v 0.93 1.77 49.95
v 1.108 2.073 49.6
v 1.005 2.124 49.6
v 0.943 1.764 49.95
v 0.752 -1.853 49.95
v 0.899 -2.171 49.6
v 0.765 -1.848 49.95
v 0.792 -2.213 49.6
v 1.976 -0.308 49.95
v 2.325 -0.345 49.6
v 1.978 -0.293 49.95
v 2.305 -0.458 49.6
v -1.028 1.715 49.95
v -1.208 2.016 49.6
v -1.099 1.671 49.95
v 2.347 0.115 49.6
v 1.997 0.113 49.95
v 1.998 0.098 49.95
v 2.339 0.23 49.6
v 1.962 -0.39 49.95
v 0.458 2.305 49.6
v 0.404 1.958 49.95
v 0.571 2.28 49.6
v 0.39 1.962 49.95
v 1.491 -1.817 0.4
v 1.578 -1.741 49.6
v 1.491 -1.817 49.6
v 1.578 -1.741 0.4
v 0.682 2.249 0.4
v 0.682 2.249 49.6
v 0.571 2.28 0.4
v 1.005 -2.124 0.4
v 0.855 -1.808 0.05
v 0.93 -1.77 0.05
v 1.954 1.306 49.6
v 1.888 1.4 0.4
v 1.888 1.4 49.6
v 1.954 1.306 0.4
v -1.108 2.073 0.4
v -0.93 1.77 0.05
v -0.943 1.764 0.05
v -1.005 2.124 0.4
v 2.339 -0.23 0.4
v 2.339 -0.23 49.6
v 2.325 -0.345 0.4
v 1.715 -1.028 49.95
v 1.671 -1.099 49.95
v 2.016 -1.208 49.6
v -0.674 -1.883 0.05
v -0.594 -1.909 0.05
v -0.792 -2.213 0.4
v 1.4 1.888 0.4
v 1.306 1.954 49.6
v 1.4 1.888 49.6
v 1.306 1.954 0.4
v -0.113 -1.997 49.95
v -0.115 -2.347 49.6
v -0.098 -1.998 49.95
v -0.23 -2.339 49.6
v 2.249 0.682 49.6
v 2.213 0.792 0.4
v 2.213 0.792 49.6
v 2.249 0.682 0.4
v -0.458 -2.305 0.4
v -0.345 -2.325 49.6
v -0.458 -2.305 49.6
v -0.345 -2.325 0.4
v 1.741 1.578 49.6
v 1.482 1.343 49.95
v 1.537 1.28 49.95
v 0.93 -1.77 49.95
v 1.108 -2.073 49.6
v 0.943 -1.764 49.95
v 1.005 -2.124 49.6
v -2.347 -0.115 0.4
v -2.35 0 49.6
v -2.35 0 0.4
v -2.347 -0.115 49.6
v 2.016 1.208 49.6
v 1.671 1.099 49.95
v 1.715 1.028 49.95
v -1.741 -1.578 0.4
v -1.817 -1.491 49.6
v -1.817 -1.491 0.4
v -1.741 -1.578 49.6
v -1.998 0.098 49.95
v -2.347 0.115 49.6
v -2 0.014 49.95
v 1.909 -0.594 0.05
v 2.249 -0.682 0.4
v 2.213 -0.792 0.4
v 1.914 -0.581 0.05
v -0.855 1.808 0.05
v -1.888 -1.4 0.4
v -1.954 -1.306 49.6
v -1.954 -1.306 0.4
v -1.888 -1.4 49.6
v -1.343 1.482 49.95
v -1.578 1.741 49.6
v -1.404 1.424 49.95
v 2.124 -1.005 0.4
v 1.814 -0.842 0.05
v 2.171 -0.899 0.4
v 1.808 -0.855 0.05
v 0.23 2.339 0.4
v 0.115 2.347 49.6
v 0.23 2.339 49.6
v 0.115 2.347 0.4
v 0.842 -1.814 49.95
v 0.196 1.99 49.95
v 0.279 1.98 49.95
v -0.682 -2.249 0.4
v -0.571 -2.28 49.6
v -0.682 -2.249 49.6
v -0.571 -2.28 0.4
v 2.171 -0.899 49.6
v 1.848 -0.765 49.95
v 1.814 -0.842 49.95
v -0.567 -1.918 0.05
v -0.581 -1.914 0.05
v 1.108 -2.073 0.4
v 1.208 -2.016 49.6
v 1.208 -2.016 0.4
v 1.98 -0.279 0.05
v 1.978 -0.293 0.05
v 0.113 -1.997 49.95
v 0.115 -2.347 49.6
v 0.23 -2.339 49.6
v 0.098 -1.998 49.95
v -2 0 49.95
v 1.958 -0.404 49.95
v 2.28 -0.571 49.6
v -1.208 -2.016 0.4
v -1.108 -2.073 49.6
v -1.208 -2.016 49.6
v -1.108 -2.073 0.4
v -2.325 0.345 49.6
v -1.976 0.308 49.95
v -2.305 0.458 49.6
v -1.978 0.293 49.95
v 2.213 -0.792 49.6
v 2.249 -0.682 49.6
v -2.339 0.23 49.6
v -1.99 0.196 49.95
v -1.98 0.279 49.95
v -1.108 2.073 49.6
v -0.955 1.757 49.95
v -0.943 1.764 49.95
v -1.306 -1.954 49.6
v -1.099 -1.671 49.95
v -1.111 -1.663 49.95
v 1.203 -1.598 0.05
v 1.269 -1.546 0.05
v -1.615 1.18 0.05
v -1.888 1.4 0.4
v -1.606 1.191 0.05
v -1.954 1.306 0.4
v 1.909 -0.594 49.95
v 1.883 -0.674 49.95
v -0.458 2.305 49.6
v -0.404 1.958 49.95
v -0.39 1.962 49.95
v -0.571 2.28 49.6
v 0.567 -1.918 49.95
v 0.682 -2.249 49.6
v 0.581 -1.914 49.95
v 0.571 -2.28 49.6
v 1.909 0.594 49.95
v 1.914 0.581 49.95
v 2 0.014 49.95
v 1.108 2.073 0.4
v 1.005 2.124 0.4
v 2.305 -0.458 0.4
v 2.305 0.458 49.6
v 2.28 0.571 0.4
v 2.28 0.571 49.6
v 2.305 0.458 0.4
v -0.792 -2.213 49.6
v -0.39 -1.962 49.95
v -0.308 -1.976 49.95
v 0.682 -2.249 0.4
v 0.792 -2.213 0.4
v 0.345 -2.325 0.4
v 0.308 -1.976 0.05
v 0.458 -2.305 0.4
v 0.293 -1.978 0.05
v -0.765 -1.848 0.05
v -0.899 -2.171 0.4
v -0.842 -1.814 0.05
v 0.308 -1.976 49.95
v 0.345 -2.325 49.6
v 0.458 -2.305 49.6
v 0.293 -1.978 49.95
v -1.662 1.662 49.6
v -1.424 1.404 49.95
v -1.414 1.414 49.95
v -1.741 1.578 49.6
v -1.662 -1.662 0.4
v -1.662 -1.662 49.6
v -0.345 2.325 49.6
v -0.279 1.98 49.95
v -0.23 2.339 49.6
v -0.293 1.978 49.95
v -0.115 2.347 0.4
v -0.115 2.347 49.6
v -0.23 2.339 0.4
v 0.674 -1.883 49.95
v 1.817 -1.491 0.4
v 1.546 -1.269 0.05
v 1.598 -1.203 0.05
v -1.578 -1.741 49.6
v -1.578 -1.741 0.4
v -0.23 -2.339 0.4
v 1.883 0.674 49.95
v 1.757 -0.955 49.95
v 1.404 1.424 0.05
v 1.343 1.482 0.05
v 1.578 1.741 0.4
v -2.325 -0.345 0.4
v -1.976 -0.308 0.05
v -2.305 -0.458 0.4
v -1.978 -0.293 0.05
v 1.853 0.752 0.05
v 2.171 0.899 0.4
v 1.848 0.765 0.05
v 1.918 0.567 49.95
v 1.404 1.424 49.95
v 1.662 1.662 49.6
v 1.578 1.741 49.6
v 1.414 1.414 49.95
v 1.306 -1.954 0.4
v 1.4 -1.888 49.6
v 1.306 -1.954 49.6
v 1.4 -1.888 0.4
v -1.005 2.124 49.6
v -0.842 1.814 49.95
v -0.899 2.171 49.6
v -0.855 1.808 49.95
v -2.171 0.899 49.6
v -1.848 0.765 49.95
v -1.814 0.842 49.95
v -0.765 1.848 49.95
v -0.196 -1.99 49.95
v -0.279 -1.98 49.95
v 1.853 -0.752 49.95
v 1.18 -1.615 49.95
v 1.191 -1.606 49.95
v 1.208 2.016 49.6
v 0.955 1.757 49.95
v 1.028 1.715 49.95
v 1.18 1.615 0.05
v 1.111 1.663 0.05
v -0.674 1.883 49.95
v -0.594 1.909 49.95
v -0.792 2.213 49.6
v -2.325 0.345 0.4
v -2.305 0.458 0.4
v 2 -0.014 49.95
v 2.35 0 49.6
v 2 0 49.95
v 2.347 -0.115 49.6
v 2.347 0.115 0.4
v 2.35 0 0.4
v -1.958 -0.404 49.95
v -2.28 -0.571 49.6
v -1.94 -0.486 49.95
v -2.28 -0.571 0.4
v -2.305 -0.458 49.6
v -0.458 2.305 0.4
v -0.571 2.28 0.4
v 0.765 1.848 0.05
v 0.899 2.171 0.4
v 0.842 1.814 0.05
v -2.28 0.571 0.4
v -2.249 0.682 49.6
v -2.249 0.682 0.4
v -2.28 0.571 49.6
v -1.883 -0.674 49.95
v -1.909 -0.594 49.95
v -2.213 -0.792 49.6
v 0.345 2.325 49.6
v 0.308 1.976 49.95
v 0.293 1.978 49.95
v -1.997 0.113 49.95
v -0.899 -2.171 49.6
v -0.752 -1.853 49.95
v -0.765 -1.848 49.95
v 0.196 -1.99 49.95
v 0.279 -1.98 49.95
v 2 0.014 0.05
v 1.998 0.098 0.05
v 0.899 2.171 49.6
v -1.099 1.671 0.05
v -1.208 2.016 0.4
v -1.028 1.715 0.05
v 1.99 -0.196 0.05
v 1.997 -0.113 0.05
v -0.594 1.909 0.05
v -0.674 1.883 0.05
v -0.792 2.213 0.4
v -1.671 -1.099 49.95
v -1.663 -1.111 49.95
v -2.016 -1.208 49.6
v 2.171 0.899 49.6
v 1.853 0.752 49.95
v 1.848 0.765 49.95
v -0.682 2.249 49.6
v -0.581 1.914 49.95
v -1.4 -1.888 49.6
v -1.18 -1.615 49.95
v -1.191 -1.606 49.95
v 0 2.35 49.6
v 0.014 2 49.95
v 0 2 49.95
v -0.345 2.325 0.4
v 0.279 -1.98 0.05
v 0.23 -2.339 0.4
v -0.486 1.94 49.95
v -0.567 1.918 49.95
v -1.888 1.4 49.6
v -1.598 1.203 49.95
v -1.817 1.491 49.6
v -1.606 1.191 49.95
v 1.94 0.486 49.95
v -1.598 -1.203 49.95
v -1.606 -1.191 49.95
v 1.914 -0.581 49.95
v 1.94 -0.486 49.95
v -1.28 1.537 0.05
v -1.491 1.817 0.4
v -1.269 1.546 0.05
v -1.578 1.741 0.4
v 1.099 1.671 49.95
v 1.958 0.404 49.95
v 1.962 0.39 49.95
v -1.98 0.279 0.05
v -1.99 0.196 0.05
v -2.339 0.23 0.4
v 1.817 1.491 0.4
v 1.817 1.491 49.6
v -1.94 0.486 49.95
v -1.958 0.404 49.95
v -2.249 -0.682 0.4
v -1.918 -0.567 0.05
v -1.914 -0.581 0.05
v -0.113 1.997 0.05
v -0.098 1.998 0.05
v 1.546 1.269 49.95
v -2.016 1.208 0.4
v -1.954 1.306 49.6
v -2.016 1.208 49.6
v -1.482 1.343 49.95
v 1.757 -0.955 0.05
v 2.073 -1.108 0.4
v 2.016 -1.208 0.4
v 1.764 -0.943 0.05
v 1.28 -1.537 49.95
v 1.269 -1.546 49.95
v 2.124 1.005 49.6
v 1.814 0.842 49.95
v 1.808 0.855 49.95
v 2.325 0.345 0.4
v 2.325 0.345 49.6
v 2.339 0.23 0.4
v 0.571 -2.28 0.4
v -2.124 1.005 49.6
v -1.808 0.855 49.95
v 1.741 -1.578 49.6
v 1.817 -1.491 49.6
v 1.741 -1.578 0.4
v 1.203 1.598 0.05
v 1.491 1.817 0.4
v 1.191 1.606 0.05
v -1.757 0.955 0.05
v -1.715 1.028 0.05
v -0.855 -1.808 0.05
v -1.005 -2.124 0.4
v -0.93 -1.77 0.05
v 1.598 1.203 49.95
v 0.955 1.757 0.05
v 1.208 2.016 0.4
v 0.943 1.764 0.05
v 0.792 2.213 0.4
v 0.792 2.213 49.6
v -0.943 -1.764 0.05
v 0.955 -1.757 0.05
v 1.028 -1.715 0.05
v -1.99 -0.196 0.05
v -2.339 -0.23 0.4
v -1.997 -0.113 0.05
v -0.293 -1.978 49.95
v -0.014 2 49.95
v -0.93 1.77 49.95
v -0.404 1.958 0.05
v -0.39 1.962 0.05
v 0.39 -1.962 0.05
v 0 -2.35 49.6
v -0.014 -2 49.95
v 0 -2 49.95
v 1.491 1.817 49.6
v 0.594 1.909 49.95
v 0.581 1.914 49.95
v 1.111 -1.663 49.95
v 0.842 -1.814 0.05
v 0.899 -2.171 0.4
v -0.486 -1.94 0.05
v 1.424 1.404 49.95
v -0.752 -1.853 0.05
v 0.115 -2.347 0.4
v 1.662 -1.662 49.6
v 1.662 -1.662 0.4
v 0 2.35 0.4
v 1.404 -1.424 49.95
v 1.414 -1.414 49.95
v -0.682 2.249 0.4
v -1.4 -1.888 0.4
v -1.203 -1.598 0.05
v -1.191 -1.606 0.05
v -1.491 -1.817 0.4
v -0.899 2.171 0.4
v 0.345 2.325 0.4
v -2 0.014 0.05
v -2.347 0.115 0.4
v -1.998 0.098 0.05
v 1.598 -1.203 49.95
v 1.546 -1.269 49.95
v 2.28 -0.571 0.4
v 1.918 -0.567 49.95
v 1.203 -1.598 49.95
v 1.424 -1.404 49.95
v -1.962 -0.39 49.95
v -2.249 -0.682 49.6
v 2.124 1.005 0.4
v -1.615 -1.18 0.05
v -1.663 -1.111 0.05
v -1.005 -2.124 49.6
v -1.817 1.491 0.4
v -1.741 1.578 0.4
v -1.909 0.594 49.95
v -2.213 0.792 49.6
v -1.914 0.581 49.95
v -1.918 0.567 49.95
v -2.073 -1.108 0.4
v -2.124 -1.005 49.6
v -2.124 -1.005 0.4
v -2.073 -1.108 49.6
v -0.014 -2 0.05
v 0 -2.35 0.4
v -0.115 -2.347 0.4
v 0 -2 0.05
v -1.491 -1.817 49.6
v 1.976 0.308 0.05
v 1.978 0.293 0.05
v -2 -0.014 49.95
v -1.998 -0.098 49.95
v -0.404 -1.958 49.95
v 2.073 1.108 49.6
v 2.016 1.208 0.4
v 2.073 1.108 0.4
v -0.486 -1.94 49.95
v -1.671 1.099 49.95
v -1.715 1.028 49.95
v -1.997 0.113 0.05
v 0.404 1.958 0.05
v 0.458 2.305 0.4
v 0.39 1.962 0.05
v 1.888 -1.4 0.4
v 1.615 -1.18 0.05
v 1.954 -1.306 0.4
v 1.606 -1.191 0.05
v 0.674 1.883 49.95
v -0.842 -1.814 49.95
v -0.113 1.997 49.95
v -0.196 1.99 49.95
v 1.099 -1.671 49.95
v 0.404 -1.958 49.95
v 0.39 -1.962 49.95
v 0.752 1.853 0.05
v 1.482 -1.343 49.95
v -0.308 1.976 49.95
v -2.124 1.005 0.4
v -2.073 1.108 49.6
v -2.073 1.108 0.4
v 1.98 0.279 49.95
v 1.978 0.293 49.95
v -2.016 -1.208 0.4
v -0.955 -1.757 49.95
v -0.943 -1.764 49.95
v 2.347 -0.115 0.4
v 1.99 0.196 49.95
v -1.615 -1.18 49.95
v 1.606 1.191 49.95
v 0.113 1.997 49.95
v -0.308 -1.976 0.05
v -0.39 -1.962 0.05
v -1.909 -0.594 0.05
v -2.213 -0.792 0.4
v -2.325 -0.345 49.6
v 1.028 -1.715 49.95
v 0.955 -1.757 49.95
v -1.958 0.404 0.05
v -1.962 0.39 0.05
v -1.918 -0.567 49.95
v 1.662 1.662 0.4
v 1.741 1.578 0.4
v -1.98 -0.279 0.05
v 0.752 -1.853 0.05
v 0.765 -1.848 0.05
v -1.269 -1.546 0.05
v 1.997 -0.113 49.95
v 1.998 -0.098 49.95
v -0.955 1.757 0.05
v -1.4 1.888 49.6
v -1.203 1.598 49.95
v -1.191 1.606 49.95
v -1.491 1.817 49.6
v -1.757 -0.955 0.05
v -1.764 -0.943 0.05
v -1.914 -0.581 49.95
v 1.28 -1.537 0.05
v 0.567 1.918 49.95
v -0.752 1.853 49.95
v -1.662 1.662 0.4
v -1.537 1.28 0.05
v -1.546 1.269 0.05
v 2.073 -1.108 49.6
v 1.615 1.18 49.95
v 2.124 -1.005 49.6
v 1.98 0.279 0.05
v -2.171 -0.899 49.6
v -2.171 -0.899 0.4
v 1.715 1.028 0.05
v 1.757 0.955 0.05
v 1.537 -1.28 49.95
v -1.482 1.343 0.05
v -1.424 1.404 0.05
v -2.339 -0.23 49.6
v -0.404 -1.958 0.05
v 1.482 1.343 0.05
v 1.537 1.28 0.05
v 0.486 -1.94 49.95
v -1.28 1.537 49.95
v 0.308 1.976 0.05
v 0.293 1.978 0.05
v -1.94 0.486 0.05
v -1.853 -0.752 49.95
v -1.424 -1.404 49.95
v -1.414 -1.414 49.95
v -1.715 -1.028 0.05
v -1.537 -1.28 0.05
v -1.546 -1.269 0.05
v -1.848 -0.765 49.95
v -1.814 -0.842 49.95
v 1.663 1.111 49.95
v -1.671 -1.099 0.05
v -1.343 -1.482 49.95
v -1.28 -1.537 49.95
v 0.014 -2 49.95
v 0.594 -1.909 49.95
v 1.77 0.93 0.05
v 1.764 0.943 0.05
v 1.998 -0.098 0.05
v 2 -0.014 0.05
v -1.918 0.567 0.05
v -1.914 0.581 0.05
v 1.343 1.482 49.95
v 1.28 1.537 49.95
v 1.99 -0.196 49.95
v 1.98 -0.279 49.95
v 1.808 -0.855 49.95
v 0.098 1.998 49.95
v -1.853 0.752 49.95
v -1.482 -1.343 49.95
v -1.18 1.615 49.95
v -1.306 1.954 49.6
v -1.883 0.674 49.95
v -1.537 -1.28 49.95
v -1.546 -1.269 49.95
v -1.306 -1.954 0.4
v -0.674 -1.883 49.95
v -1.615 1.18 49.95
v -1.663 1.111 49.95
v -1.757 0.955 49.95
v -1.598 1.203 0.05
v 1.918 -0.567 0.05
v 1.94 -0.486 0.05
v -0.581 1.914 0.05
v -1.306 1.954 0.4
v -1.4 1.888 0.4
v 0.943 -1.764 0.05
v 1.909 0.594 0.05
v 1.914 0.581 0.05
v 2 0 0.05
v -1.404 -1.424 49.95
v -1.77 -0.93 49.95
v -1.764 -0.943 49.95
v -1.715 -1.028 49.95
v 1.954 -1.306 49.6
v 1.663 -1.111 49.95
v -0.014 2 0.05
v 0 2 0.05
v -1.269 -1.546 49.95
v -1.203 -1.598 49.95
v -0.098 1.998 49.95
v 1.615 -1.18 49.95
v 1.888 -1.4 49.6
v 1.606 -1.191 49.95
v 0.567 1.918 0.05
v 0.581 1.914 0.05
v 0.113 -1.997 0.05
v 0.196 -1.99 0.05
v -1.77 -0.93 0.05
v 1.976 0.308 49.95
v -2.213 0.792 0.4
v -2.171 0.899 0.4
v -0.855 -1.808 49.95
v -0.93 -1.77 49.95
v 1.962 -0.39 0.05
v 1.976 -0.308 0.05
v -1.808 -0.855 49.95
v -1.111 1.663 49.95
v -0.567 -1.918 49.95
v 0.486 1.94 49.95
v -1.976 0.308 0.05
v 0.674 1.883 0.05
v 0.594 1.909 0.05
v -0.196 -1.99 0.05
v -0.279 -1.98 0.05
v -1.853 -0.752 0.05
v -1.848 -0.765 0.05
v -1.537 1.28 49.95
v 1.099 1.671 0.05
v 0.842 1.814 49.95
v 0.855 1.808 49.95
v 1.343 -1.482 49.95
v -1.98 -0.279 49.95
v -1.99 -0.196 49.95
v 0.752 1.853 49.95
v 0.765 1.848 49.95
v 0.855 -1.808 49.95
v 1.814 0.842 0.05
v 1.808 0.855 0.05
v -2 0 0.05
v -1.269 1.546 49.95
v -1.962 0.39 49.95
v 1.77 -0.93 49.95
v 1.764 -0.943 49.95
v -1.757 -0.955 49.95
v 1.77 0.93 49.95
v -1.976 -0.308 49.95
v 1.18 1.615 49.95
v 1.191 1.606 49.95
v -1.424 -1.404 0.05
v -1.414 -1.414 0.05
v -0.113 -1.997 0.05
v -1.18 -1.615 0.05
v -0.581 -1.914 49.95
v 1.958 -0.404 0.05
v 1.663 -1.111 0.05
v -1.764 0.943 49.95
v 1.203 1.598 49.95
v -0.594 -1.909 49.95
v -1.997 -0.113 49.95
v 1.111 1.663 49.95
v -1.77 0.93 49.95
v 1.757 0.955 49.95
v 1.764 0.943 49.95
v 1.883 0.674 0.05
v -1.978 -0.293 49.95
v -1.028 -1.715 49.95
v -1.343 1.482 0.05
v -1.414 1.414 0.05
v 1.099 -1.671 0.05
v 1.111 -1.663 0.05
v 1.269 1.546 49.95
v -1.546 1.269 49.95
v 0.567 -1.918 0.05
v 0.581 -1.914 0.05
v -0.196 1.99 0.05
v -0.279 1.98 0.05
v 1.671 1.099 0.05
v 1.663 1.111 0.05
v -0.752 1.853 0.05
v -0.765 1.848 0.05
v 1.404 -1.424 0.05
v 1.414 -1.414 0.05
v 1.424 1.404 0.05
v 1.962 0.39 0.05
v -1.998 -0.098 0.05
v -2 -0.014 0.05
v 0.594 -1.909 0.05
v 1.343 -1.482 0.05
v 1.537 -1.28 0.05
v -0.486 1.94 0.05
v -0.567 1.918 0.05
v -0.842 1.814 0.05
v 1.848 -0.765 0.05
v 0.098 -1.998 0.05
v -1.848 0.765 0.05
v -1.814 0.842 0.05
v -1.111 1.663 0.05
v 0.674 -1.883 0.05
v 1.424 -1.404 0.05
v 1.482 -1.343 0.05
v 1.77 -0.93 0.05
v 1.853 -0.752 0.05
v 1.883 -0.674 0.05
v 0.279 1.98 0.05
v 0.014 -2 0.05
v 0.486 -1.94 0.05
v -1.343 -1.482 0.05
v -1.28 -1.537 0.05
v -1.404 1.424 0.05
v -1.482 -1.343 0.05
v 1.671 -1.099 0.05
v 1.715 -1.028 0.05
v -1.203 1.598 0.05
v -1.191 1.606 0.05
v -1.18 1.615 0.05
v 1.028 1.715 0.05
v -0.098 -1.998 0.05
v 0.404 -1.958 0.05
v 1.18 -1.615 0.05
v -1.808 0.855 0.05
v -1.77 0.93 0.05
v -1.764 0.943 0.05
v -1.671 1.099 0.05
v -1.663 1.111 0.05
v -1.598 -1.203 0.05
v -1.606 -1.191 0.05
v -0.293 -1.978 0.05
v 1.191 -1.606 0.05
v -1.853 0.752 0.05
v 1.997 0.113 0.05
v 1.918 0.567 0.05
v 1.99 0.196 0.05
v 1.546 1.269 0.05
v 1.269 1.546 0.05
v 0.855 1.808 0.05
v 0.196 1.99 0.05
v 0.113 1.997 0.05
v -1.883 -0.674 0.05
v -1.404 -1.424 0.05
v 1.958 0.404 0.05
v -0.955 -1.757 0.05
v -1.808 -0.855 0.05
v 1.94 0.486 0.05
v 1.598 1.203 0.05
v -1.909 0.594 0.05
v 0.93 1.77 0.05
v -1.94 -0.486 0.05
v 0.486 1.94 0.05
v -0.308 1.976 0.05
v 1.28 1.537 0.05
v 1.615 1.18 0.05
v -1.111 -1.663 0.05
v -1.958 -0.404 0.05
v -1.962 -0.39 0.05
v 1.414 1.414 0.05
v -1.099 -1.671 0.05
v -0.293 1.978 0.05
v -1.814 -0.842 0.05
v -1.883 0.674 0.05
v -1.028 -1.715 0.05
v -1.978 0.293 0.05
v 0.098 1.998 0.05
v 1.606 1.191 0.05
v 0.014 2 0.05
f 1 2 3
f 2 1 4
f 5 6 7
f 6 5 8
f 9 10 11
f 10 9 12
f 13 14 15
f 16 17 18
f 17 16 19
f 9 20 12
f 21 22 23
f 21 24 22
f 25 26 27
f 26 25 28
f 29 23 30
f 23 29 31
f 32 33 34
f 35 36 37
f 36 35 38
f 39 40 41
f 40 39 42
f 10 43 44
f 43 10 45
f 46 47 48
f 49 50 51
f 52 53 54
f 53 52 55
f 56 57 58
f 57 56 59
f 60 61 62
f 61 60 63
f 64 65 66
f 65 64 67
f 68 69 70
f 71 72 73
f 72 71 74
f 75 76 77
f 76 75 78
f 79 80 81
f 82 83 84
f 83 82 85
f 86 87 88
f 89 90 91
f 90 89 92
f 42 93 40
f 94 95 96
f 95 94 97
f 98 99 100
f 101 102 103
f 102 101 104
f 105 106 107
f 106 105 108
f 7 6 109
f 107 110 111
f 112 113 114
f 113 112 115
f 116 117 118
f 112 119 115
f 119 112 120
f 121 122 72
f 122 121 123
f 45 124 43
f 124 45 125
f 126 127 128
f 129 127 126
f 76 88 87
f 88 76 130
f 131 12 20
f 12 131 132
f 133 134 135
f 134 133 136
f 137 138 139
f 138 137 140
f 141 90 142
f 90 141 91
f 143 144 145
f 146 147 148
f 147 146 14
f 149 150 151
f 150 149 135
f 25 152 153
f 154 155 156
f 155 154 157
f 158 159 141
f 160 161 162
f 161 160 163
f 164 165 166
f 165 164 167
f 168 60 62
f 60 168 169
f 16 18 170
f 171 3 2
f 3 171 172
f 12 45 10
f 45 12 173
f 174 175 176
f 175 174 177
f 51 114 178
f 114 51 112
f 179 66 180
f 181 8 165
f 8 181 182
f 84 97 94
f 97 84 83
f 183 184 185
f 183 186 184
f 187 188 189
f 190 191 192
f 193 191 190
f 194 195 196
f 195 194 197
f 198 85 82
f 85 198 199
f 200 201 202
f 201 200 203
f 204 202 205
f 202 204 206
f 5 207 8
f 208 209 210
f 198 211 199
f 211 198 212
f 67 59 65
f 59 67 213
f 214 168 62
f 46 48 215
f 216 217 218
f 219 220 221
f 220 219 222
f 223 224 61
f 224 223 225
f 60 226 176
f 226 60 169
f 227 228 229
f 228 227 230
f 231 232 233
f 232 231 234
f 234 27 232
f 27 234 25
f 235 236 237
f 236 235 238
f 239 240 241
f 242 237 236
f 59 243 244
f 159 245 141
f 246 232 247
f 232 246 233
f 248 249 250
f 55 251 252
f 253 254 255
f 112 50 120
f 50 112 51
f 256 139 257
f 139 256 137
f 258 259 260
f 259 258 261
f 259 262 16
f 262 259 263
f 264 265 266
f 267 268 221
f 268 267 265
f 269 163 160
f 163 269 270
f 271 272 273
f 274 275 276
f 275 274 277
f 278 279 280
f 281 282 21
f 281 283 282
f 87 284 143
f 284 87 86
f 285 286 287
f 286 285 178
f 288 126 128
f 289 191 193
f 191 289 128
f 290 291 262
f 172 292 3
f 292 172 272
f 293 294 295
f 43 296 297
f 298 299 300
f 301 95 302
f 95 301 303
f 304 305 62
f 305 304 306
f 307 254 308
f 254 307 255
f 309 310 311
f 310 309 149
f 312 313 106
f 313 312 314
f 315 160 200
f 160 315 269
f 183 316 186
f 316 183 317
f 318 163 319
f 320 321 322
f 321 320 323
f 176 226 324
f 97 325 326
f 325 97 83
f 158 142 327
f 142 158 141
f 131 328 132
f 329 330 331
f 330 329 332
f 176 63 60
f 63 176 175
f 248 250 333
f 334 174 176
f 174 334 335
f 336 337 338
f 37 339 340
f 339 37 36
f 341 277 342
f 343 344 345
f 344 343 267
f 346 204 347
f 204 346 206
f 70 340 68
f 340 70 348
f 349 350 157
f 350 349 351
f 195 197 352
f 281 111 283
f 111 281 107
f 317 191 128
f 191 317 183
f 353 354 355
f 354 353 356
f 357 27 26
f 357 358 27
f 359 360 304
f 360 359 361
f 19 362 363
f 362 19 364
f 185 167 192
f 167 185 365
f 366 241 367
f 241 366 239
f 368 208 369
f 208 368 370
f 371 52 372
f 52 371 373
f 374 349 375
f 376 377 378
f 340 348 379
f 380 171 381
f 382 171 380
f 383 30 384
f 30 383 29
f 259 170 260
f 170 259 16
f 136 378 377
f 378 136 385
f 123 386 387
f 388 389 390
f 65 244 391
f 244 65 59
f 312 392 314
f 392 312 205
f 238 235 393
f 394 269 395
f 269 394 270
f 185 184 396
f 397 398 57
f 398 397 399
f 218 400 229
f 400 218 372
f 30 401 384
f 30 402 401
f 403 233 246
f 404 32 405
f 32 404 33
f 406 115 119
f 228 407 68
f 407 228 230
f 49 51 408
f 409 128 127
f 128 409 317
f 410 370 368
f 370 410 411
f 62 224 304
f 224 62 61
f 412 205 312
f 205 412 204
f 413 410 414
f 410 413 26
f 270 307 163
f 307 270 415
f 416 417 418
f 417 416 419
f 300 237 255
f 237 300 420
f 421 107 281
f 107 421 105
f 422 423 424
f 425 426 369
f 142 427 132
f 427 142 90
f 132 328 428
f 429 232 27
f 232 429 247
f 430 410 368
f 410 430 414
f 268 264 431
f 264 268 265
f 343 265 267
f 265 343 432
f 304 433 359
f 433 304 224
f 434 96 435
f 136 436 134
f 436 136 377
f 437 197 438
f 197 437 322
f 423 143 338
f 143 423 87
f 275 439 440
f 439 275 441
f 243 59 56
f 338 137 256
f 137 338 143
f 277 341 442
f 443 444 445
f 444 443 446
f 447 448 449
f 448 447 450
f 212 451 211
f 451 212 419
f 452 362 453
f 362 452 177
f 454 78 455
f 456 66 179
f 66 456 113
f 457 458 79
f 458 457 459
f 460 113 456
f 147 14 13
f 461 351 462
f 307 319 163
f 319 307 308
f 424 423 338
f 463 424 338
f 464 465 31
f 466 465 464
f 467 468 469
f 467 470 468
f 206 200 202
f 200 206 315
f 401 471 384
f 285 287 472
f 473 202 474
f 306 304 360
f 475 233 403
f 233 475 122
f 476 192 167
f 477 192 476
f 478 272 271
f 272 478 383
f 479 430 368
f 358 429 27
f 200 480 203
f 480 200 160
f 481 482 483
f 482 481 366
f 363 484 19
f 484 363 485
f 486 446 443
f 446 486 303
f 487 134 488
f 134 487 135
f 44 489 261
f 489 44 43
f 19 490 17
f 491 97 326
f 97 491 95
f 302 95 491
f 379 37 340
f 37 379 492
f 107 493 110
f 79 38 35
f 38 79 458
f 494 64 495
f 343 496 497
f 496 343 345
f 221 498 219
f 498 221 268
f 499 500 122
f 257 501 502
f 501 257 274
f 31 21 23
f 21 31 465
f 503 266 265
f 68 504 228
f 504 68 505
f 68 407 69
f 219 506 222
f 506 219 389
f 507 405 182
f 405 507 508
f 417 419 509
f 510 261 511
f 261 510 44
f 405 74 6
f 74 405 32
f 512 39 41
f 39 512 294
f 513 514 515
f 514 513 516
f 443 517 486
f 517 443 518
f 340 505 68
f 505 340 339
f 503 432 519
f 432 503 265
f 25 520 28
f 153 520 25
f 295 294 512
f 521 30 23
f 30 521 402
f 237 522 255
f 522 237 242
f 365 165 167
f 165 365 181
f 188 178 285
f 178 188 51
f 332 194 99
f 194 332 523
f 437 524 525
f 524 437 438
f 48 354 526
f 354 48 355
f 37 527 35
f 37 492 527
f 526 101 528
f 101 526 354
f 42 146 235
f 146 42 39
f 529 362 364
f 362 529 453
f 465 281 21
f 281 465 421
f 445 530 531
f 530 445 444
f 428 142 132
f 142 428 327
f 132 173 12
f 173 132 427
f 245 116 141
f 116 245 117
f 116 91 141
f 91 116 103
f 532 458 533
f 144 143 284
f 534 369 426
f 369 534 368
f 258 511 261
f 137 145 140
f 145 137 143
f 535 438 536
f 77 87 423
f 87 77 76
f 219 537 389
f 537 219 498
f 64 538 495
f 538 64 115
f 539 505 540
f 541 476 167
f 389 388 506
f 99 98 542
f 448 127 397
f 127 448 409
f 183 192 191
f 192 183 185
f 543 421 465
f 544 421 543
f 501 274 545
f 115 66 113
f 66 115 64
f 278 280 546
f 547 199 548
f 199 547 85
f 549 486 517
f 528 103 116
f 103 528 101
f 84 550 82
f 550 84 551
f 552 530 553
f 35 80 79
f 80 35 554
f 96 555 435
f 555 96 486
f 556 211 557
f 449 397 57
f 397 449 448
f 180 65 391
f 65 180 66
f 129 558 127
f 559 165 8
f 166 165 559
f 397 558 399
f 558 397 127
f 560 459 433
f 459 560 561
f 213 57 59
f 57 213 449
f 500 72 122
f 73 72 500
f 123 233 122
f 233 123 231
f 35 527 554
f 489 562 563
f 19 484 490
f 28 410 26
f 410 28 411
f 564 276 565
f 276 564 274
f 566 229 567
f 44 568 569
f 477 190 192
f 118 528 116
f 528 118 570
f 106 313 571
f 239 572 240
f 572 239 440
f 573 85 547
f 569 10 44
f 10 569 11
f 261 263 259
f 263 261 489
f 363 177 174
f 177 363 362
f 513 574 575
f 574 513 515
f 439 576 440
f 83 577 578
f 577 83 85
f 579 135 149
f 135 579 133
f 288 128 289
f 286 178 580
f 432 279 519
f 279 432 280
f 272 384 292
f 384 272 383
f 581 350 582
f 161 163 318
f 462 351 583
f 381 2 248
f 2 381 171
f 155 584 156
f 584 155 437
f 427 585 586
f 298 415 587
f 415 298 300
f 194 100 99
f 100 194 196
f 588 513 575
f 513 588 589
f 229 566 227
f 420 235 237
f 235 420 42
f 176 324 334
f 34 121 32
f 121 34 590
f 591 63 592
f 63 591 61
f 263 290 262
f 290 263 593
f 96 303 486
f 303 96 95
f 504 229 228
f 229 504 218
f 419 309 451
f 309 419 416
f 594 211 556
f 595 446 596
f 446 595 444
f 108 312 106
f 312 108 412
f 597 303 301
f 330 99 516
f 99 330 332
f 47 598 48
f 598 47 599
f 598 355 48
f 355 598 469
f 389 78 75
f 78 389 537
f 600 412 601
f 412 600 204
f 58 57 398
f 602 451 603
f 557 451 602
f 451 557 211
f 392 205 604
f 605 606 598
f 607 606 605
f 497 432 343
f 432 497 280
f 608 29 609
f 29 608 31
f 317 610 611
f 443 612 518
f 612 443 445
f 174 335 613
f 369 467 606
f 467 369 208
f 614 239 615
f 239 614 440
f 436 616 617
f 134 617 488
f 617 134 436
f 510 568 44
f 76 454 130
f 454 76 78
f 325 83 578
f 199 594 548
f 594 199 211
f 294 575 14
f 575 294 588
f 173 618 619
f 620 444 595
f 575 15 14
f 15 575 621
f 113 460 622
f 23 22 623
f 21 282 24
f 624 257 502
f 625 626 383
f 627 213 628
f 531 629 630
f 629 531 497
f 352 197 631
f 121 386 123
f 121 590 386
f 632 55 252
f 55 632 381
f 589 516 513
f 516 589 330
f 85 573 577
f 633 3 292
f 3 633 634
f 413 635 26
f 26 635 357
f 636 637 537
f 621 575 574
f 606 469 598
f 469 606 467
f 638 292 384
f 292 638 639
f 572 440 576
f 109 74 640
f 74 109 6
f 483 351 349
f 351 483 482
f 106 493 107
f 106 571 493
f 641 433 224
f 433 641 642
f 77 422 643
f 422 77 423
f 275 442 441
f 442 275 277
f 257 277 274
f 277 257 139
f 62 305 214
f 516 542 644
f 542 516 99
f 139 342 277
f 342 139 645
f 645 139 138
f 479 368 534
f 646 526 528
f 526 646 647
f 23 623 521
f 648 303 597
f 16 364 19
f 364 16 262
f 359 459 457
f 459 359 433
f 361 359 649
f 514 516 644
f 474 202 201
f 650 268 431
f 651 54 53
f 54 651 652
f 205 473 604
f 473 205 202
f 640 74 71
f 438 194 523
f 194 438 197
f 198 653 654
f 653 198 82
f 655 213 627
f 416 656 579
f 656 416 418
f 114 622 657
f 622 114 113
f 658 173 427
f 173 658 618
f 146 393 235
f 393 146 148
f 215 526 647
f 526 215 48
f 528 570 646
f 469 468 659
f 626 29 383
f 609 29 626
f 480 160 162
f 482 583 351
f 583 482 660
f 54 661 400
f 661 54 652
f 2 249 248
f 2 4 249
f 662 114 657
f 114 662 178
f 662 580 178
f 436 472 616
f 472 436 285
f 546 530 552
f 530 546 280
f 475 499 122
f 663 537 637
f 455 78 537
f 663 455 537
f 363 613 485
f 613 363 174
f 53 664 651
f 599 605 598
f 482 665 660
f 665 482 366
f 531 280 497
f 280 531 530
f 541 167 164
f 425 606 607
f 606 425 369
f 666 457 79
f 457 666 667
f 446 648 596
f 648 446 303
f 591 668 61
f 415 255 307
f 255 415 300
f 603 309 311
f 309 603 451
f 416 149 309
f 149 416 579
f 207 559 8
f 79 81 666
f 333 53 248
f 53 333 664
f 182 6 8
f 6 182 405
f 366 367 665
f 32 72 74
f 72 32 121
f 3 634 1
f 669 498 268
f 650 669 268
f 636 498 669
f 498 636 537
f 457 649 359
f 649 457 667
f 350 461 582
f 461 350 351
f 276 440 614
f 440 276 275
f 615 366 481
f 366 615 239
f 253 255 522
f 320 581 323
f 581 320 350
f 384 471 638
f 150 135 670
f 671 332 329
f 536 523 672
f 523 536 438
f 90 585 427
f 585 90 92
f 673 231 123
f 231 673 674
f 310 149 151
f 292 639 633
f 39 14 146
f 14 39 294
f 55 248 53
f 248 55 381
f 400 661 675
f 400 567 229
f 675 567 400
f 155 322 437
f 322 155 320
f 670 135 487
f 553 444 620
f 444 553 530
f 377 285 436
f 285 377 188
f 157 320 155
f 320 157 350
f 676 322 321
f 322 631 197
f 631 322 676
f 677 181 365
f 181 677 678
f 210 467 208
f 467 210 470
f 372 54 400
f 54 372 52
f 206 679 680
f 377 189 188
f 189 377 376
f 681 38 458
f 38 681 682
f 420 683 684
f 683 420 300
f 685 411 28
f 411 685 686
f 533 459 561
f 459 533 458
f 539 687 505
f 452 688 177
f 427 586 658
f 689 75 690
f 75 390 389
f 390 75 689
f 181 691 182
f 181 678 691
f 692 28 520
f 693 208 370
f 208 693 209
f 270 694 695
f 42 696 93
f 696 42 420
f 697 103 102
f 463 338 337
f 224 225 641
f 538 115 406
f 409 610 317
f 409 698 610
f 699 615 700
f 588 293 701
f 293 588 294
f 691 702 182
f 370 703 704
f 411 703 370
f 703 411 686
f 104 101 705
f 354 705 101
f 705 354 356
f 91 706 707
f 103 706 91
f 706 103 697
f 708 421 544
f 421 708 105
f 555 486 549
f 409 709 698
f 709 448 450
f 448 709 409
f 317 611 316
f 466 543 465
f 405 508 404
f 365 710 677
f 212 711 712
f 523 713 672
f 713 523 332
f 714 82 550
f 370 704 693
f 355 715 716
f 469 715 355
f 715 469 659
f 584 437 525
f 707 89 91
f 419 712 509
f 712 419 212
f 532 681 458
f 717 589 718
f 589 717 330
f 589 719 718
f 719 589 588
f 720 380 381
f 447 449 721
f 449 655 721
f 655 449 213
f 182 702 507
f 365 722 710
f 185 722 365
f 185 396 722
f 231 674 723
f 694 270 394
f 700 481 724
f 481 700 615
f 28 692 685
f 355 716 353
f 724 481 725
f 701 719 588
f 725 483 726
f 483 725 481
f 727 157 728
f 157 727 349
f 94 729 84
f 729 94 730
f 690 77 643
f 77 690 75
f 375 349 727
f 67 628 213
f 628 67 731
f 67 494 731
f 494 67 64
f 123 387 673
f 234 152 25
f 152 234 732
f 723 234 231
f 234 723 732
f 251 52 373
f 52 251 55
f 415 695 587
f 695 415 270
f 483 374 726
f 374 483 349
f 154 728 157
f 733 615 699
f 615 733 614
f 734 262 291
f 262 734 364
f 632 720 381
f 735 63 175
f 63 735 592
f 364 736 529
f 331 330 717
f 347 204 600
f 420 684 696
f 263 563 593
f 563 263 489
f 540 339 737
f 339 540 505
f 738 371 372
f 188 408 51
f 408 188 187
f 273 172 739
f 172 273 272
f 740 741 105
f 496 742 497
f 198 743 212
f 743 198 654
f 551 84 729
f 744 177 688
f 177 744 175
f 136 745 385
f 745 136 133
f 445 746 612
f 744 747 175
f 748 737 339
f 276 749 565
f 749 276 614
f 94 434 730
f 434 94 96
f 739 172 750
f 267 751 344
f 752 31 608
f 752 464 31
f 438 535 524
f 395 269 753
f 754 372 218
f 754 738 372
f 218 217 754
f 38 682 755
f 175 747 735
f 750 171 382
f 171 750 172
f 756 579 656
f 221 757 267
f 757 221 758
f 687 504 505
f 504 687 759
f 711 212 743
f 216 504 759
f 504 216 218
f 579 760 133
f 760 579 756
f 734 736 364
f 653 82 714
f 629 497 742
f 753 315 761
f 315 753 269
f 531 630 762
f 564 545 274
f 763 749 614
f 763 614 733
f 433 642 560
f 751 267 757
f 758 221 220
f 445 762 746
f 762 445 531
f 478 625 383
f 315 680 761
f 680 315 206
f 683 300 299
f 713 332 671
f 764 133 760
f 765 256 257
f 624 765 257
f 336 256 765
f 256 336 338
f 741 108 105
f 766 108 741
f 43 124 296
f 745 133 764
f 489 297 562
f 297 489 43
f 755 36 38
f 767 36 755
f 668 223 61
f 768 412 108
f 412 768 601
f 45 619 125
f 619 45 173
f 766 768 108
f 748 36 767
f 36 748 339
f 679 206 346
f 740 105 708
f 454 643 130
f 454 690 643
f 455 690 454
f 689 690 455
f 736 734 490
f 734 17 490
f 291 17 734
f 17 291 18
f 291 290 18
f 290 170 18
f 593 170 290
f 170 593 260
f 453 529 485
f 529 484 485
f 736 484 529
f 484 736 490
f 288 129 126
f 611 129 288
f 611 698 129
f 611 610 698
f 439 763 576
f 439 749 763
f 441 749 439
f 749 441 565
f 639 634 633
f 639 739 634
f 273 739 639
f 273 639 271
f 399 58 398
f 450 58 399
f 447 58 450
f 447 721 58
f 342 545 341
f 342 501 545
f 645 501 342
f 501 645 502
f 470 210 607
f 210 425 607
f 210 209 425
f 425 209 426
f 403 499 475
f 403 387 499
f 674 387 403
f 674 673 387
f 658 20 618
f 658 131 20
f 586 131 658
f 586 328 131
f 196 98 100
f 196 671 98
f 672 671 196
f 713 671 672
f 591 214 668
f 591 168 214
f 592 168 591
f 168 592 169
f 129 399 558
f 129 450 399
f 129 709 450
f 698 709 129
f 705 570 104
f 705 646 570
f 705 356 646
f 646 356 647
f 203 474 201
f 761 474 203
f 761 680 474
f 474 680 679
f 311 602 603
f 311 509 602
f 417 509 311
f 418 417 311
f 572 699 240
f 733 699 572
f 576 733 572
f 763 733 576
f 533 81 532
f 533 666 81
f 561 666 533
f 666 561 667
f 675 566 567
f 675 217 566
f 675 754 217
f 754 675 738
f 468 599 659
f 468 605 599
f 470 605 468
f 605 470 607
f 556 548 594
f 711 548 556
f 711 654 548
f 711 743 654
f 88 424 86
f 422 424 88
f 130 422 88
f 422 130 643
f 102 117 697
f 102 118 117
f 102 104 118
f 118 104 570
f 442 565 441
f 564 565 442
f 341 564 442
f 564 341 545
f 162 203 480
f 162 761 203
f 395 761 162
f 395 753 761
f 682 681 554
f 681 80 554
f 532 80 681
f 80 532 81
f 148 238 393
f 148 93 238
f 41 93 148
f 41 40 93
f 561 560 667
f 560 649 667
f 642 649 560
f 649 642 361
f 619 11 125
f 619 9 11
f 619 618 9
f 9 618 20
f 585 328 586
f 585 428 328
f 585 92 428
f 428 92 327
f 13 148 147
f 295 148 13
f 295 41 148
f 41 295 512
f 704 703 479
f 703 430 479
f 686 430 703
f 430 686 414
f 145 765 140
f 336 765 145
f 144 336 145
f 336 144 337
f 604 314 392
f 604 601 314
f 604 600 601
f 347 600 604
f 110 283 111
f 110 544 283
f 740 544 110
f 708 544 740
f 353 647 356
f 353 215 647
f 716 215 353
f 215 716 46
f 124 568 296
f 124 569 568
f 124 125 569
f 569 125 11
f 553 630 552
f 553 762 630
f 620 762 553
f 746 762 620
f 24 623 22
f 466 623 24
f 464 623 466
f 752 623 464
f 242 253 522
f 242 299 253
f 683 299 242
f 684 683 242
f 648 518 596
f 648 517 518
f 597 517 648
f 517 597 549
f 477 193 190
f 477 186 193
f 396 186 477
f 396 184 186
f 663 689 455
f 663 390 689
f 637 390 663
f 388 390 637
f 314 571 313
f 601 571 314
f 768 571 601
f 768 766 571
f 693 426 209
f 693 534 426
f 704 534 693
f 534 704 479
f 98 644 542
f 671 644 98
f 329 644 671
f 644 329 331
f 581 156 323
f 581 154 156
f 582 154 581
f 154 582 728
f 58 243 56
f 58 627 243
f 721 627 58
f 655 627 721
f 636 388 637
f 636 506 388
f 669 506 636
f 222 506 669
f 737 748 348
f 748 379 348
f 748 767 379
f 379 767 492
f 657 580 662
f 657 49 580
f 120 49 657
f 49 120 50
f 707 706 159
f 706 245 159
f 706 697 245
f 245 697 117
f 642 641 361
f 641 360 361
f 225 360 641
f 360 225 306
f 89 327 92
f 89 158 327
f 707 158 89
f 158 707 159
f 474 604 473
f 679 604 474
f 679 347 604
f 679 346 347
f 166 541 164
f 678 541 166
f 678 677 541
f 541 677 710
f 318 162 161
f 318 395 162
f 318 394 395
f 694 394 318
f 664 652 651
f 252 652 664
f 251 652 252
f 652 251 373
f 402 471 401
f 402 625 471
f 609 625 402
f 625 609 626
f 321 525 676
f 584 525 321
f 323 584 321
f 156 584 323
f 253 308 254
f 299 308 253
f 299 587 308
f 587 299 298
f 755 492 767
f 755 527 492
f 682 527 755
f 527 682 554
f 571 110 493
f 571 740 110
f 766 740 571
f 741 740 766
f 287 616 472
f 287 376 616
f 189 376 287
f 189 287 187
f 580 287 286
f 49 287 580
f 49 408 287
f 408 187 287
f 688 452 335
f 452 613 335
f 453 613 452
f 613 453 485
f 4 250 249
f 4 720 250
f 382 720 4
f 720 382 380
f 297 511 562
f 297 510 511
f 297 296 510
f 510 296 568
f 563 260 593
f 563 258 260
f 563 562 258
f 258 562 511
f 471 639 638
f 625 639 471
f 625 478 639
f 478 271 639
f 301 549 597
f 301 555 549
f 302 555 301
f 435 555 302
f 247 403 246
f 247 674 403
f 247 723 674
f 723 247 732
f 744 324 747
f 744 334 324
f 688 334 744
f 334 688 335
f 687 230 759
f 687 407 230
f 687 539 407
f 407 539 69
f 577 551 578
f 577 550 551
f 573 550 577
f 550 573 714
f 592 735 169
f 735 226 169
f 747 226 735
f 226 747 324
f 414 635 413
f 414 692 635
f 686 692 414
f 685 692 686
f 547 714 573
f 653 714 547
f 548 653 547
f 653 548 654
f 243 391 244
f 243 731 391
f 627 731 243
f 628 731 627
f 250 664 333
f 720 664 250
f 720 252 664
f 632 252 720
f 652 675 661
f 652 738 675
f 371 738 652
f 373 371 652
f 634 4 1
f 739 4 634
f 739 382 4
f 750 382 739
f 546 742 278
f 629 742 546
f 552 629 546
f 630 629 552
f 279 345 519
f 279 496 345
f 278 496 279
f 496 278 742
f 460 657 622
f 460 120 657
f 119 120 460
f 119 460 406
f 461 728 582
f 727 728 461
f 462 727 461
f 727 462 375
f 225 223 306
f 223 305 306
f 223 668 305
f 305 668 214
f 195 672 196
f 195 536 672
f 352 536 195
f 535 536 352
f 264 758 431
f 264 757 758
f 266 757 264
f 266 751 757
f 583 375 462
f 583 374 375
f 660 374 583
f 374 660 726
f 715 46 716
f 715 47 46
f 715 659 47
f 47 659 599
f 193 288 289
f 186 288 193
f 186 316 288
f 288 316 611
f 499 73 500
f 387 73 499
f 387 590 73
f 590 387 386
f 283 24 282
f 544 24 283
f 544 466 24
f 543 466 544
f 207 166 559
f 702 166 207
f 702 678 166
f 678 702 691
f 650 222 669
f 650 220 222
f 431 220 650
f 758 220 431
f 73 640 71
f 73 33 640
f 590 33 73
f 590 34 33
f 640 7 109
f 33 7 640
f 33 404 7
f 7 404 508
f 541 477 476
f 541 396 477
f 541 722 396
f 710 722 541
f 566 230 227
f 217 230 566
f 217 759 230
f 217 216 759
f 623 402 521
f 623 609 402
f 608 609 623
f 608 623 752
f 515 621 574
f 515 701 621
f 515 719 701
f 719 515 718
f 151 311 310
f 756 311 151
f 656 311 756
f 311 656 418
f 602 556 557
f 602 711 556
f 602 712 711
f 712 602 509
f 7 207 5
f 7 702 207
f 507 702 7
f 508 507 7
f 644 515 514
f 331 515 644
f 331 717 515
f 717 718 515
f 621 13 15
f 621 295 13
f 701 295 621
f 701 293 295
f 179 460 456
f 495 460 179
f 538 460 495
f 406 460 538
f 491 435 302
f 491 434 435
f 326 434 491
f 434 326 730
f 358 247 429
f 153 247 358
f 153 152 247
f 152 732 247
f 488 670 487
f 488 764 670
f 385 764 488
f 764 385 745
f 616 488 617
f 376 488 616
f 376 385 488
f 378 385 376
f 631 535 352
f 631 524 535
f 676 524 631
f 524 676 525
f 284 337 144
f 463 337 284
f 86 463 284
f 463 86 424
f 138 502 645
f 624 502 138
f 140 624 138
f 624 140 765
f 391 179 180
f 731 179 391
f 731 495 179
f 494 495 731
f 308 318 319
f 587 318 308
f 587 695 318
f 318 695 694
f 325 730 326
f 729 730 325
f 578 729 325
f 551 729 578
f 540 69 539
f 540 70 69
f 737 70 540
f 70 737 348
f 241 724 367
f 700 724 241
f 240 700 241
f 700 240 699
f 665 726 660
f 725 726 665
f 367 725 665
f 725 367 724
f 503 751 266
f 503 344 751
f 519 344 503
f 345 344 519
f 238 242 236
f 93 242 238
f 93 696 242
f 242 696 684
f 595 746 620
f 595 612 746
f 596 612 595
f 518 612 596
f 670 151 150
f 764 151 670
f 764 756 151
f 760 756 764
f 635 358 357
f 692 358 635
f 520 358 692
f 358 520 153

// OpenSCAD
$fn = 128;

// PTFE heatshrink sleeving (simple hollow tube model)
// Units: mm

// Parameters
length = 50;          // overall length
id = 4.0;             // inner diameter (before/after shrink as desired)
wall = 0.35;          // wall thickness
od = id + 2*wall;     // outer diameter

// Optional: slight end chamfer to mimic cut tubing
chamfer = 0.4;        // set to 0 for square ends

module tube(L, ID, OD, cham=0) {
    difference() {
        // Outer
        if (cham > 0) {
            // Chamfered ends via hull of two cylinders
            hull() {
                translate([0,0,0]) cylinder(h=cham, d=OD - 2*cham);
                translate([0,0,cham]) cylinder(h=L - 2*cham, d=OD);
                translate([0,0,L - cham]) cylinder(h=cham, d=OD - 2*cham);
            }
        } else {
            cylinder(h=L, d=OD);
        }

        // Inner bore (slightly extended to ensure clean subtraction)
        translate([0,0,-0.5]) cylinder(h=L + 1.0, d=ID);
    }
}

tube(length, id, od, chamfer);
